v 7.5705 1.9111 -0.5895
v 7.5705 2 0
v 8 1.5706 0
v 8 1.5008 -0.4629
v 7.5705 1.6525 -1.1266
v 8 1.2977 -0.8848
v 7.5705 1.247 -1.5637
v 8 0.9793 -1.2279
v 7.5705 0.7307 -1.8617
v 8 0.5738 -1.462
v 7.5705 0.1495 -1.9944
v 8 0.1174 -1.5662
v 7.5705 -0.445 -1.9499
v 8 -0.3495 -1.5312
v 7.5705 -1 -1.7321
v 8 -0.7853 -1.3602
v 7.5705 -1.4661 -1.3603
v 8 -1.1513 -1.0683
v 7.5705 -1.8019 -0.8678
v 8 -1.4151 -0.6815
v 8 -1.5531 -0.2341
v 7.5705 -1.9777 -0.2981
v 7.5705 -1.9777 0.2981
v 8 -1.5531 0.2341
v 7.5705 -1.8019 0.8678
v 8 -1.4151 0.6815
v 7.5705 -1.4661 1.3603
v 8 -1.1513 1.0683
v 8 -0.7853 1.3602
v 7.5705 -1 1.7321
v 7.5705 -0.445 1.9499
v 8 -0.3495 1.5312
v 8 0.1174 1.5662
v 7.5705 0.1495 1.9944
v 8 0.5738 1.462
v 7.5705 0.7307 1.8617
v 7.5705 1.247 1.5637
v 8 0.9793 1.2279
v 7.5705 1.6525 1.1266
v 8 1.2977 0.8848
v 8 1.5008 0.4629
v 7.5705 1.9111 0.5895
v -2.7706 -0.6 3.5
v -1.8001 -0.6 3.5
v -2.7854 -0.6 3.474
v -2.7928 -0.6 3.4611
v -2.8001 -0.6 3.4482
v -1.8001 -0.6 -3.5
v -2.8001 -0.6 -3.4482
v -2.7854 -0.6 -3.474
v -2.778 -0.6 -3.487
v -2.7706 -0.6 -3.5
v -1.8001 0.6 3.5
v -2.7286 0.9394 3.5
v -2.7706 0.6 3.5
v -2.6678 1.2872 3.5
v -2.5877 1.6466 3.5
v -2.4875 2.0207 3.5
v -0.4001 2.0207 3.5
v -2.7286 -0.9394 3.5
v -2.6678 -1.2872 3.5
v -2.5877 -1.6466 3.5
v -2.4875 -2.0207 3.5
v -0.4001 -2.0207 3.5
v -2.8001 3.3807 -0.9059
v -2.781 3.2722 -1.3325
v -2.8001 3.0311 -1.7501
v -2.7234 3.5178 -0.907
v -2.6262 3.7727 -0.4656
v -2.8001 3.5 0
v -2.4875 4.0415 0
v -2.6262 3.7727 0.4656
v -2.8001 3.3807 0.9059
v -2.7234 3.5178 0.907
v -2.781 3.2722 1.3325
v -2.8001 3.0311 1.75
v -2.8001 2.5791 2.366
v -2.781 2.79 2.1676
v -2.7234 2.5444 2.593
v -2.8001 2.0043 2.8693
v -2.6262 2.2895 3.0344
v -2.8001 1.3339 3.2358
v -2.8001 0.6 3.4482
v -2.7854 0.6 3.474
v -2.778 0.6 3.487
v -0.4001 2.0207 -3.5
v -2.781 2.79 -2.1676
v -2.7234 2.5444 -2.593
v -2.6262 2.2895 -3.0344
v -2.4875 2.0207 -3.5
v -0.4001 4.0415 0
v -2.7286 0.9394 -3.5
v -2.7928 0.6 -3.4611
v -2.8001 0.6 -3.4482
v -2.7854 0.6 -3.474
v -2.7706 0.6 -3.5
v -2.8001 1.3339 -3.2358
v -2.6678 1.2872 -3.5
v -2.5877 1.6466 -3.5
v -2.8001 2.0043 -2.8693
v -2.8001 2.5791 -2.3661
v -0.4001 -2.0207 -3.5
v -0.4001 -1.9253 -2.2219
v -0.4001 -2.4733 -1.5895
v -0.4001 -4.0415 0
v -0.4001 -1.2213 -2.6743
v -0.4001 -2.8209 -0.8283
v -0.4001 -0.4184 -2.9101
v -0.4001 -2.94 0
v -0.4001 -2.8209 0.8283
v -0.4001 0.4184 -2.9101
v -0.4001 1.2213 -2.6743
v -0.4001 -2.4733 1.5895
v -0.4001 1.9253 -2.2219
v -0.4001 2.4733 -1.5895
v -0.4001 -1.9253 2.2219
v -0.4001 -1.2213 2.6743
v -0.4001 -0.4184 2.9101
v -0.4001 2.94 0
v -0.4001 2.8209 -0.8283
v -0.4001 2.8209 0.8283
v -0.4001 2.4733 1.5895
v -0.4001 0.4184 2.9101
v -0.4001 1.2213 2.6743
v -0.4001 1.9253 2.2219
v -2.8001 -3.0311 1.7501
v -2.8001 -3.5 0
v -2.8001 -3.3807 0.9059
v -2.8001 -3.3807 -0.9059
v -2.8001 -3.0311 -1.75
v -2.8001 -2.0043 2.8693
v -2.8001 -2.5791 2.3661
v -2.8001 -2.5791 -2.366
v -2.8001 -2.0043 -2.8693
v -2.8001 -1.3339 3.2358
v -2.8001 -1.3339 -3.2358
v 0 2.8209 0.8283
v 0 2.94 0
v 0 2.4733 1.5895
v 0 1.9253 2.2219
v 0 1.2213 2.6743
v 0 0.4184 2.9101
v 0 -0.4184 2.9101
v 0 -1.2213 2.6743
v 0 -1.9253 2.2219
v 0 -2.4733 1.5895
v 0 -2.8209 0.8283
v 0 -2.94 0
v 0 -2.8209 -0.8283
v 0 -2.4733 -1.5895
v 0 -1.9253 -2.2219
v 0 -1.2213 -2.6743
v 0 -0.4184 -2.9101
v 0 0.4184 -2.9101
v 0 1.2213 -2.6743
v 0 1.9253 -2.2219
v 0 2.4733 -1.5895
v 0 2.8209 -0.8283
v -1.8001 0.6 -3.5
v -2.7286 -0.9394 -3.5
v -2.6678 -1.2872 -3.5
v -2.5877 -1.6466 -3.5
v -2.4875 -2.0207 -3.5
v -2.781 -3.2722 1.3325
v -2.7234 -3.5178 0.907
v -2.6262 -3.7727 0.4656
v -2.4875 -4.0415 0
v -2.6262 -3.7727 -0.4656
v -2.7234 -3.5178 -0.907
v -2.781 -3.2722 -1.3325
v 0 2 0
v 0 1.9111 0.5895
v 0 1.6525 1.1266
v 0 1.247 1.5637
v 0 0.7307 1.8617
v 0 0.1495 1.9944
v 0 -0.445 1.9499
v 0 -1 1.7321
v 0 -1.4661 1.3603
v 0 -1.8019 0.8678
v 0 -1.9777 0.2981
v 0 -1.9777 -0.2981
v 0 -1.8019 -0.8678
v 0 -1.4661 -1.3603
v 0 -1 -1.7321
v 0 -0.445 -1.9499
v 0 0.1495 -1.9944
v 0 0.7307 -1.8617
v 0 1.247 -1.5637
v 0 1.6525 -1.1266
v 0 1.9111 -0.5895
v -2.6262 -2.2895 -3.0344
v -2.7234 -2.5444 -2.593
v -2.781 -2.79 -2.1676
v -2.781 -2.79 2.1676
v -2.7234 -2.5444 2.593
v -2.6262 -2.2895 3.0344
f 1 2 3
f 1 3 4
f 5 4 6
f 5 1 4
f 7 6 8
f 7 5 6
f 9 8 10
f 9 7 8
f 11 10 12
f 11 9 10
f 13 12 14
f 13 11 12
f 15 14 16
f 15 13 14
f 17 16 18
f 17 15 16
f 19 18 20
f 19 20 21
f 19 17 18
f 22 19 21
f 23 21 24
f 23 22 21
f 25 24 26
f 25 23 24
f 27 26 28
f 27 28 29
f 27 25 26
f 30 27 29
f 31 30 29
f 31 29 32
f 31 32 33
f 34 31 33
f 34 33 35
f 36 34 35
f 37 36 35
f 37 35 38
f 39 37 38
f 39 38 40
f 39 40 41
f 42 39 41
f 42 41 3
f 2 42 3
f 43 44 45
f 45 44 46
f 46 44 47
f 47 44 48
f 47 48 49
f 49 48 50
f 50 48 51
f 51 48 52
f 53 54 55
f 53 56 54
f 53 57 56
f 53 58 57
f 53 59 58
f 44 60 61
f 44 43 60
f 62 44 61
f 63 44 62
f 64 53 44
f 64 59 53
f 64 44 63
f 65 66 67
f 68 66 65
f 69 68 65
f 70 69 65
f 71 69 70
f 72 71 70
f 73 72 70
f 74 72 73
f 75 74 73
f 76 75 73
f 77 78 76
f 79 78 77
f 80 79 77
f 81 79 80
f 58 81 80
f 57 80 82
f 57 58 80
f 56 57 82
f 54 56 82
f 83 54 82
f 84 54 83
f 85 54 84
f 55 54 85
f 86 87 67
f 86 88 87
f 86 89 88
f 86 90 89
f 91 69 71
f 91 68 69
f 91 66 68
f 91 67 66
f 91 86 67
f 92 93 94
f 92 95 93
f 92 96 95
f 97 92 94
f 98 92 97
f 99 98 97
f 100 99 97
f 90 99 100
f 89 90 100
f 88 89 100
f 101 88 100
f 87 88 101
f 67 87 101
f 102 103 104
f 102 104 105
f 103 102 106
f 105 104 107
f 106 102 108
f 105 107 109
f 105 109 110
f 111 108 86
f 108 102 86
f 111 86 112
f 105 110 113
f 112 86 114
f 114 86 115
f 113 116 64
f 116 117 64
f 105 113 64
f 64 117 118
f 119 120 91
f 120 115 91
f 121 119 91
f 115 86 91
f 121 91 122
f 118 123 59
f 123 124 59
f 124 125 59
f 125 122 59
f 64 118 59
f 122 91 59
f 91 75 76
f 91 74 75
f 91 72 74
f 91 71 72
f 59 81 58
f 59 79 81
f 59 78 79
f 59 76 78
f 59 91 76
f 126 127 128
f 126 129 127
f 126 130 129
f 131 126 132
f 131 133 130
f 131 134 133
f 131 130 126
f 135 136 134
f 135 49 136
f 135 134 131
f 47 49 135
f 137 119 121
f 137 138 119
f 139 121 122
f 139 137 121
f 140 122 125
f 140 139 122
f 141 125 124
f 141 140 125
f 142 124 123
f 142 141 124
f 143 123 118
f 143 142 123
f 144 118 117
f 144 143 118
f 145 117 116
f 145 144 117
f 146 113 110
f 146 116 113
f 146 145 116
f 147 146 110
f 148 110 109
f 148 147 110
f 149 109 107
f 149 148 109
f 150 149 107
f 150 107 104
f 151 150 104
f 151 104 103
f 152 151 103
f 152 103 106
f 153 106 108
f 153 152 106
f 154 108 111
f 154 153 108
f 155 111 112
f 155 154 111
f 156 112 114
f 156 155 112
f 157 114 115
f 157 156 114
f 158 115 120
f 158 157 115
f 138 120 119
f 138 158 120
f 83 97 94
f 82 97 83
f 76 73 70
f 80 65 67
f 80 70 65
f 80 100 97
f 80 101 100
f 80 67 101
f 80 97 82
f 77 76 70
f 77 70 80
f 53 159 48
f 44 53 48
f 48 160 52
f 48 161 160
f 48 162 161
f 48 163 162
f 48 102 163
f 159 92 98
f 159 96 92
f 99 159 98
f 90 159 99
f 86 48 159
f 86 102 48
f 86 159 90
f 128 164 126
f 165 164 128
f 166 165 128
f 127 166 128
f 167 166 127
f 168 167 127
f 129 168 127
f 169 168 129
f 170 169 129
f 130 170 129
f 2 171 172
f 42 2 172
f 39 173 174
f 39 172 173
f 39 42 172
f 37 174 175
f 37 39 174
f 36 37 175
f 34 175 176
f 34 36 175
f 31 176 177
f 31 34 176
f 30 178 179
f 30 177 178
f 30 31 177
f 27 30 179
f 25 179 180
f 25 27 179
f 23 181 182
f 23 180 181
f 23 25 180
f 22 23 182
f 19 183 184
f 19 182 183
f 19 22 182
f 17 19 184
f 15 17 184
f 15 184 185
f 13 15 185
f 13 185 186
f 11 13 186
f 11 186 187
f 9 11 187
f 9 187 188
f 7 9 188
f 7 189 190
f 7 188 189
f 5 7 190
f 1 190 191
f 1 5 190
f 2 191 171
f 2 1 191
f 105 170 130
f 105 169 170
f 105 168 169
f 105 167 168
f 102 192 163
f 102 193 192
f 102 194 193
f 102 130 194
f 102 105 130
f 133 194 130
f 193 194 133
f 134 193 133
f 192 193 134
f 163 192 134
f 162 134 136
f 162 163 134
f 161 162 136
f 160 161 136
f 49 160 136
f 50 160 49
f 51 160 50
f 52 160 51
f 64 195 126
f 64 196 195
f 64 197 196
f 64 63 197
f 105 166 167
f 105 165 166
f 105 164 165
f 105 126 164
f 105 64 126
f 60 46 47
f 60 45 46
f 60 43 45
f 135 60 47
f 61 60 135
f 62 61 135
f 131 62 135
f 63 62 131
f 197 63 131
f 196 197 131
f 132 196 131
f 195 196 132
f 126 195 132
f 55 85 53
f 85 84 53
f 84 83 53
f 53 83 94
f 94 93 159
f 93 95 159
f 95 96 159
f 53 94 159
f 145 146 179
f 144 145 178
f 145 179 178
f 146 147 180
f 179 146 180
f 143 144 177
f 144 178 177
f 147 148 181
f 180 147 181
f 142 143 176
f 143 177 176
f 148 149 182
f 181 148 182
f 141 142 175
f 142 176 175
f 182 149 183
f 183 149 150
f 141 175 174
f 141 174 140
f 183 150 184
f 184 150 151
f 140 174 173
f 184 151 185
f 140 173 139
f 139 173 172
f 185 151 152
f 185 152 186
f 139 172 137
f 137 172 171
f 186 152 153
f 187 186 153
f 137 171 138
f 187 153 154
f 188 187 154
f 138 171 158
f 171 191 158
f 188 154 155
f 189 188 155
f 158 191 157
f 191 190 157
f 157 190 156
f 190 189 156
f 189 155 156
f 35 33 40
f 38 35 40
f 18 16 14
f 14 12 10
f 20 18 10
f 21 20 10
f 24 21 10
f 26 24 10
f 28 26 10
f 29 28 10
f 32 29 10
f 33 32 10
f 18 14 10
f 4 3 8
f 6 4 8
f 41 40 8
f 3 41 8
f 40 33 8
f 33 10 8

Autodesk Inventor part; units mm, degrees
ref_plane "YZ Plane" through (0, 0, 0) normal (1, 0, 0) x (0, 1, 0)
ref_plane "XZ Plane" through (0, 0, 0) normal (0, 1, 0) x (-1, 0, 0)
sketch "Sketch1" plane through (0, 0, 0) normal (0, 0, 1) x (1, 0, 0)
  line L0 (0, 2.94) -> (0, 2)
  line L1 (0, 2) -> (8, 2)
  line L2 (8, 2) -> (8, 0)
  line L3 (8, 0) -> (-0.4001, 0)
  line L4 (-2.0801, 0) -> (9.68, 0) projected
  line L5 (-0.4001, 0) -> (-0.4001, 2.94)
  line L6 (-0.4001, 2.94) -> (0, 2.94)
  line L7 (0, -0.588) -> (0, 3.528) projected
  dimension "d0" = 8
  dimension "d1" = 4
  dimension "d8" = 0.4001
  dimension "d9" = 5.88
revolve "Body" add sketch "Sketch1" angle 360 about axis through (8, 0, 0) along (-1, 0, 0)
sketch "Sketch2" plane through (-0.4001, 0, 0) normal (-1, 0, 0) x (0, 0, 1)
  line L0 (0, 4.0415) -> (3.5, 2.0207)
  line L1 (3.5, 2.0207) -> (3.5, -2.0207)
  line L2 (3.5, -2.0207) -> (0, -4.0415)
  line L3 (0, -4.0415) -> (-3.5, -2.0207)
  line L4 (-3.5, -2.0207) -> (-3.5, 2.0207)
  line L5 (-3.5, 2.0207) -> (0, 4.0415)
  point P0 (0, 0)
  point P1 (0, 0)
  dimension "d10" = 7
extrude "Head" add sketch "Sketch2" along normal blind 2.4
sketch "Sketch3" plane through (0, 0, 0) normal (0, 0, 1) x (1, 0, 0)
  line L0 (-2.8001, 0.6) -> (-1.8001, 0.6)
  line L1 (-1.8001, 0.6) -> (-1.8001, -0.6)
  line L2 (-1.8001, -0.6) -> (-2.8001, -0.6)
  line L3 (-2.8001, -0.6) -> (-2.8001, 0.6)
  line L4 (-1.8001, 0) -> (-2.8001, 0) construction
  line L5 (-3.0001, 0) -> (-1.6001, 0) projected
  line L6 (-2.8001, 2.0207) -> (-2.8001, -2.0207) projected
  dimension "d11" = 1.2
  dimension "d13" = 1
extrude "Slot" cut sketch "Sketch3" along normal through all both and the other way through all
sketch "Sketch4" plane through (0, 0, 0) normal (0, 0, 1) x (1, 0, 0)
  line L0 (-2.8001, 3.5) -> (-2.8001, 4.0415)
  line L1 (-2.8001, 4.0415) -> (-2.4875, 4.0415)
  line L2 (-2.4875, 4.0415) -> (-2.8001, 3.5)
  line L3 (-2.4875, 4.0415) -> (-2.8001, 4.0415)
  line L4 (-2.8001, 4.0415) -> (-2.8001, 3.5)
  line L5 (-2.8001, 4.0415) -> (-2.8001, 2.0207) projected
  line L6 (-3.2801, 0) -> (0.0799, 0) projected
  line L7 (-0.4001, 4.0415) -> (-2.8001, 4.0415) projected
  dimension "d4" = 30
  dimension "d17" = 7
revolve "Chamfer1" cut sketch "Sketch4" angle 360 about axis through (-10, 0, 0) along (1, 0, 0)
thread "Thread" size "M4x0.7" designation "M4" class "6g" standard "GB Metric profile" length 7.3
chamfer "Chamfer2" distance 0.4294 distance2 0.4295 1 edges at (8, -2, 0) measured on face at (8, 0.6473, -0.1595)
ref_plane "Work Plane1" through (60, 0, 0) normal (0, 0, 1) x (1, 0, 0)
equation "\"d0\" = NLG"
equation "\"d1\" = GD"
equation "\"d9\" = SD2"
equation "\"d10\" = SW"
equation "\"d2\" = KOH - SD"
equation "\"d11\" = SBR"
equation "\"d13\" = STI"
equation "\"d4\" = ANG1"
equation "\"d17\" = SW0"
equation "\"d15\" = GEL"
equation "\"d5\" = -0.5 * SPD + 0.5 * GD"
equation "\"NLG\" = 8"
equation "\"GD\" = NND"
equation "\"KOH\" = 2.8"
equation "\"GEL\" = 7.3"
equation "\"SW\" = 7"
equation "\"SW0\" = SW"
equation "\"SPD\" = NND - 1.2269 * PTC"
equation "\"SD2\" = SDH"
equation "\"SD\" = WFT"
equation "\"ANG1\" = 30deg"
equation "\"GUL\" = 0.61345 * PTC"
equation "\"STI\" = 1"
equation "\"SBR\" = 1.2"
equation "\"RR\" = 0.2"
equation "\"GAL\" = 0.61345 * PTC"
equation "\"BDM\" = NND"
equation "\"WFT\" = 0.4"
equation "\"FAWI\" = 45deg"
equation "\"PTC\" = 0.7"
equation "\"THREADDIA\" = 4"
equation "\"E0\" = 1.155 * SW"
equation "\"TOA\" = 30deg"
equation "\"NND\" = 4"
equation "\"GD1\" = THREADDIA - 1.2269 * PTC"
equation "\"SDH\" = 5.88"
properties part number "Bolt GB/T 29.1 M4 x 8" material "Steel, Mild"
